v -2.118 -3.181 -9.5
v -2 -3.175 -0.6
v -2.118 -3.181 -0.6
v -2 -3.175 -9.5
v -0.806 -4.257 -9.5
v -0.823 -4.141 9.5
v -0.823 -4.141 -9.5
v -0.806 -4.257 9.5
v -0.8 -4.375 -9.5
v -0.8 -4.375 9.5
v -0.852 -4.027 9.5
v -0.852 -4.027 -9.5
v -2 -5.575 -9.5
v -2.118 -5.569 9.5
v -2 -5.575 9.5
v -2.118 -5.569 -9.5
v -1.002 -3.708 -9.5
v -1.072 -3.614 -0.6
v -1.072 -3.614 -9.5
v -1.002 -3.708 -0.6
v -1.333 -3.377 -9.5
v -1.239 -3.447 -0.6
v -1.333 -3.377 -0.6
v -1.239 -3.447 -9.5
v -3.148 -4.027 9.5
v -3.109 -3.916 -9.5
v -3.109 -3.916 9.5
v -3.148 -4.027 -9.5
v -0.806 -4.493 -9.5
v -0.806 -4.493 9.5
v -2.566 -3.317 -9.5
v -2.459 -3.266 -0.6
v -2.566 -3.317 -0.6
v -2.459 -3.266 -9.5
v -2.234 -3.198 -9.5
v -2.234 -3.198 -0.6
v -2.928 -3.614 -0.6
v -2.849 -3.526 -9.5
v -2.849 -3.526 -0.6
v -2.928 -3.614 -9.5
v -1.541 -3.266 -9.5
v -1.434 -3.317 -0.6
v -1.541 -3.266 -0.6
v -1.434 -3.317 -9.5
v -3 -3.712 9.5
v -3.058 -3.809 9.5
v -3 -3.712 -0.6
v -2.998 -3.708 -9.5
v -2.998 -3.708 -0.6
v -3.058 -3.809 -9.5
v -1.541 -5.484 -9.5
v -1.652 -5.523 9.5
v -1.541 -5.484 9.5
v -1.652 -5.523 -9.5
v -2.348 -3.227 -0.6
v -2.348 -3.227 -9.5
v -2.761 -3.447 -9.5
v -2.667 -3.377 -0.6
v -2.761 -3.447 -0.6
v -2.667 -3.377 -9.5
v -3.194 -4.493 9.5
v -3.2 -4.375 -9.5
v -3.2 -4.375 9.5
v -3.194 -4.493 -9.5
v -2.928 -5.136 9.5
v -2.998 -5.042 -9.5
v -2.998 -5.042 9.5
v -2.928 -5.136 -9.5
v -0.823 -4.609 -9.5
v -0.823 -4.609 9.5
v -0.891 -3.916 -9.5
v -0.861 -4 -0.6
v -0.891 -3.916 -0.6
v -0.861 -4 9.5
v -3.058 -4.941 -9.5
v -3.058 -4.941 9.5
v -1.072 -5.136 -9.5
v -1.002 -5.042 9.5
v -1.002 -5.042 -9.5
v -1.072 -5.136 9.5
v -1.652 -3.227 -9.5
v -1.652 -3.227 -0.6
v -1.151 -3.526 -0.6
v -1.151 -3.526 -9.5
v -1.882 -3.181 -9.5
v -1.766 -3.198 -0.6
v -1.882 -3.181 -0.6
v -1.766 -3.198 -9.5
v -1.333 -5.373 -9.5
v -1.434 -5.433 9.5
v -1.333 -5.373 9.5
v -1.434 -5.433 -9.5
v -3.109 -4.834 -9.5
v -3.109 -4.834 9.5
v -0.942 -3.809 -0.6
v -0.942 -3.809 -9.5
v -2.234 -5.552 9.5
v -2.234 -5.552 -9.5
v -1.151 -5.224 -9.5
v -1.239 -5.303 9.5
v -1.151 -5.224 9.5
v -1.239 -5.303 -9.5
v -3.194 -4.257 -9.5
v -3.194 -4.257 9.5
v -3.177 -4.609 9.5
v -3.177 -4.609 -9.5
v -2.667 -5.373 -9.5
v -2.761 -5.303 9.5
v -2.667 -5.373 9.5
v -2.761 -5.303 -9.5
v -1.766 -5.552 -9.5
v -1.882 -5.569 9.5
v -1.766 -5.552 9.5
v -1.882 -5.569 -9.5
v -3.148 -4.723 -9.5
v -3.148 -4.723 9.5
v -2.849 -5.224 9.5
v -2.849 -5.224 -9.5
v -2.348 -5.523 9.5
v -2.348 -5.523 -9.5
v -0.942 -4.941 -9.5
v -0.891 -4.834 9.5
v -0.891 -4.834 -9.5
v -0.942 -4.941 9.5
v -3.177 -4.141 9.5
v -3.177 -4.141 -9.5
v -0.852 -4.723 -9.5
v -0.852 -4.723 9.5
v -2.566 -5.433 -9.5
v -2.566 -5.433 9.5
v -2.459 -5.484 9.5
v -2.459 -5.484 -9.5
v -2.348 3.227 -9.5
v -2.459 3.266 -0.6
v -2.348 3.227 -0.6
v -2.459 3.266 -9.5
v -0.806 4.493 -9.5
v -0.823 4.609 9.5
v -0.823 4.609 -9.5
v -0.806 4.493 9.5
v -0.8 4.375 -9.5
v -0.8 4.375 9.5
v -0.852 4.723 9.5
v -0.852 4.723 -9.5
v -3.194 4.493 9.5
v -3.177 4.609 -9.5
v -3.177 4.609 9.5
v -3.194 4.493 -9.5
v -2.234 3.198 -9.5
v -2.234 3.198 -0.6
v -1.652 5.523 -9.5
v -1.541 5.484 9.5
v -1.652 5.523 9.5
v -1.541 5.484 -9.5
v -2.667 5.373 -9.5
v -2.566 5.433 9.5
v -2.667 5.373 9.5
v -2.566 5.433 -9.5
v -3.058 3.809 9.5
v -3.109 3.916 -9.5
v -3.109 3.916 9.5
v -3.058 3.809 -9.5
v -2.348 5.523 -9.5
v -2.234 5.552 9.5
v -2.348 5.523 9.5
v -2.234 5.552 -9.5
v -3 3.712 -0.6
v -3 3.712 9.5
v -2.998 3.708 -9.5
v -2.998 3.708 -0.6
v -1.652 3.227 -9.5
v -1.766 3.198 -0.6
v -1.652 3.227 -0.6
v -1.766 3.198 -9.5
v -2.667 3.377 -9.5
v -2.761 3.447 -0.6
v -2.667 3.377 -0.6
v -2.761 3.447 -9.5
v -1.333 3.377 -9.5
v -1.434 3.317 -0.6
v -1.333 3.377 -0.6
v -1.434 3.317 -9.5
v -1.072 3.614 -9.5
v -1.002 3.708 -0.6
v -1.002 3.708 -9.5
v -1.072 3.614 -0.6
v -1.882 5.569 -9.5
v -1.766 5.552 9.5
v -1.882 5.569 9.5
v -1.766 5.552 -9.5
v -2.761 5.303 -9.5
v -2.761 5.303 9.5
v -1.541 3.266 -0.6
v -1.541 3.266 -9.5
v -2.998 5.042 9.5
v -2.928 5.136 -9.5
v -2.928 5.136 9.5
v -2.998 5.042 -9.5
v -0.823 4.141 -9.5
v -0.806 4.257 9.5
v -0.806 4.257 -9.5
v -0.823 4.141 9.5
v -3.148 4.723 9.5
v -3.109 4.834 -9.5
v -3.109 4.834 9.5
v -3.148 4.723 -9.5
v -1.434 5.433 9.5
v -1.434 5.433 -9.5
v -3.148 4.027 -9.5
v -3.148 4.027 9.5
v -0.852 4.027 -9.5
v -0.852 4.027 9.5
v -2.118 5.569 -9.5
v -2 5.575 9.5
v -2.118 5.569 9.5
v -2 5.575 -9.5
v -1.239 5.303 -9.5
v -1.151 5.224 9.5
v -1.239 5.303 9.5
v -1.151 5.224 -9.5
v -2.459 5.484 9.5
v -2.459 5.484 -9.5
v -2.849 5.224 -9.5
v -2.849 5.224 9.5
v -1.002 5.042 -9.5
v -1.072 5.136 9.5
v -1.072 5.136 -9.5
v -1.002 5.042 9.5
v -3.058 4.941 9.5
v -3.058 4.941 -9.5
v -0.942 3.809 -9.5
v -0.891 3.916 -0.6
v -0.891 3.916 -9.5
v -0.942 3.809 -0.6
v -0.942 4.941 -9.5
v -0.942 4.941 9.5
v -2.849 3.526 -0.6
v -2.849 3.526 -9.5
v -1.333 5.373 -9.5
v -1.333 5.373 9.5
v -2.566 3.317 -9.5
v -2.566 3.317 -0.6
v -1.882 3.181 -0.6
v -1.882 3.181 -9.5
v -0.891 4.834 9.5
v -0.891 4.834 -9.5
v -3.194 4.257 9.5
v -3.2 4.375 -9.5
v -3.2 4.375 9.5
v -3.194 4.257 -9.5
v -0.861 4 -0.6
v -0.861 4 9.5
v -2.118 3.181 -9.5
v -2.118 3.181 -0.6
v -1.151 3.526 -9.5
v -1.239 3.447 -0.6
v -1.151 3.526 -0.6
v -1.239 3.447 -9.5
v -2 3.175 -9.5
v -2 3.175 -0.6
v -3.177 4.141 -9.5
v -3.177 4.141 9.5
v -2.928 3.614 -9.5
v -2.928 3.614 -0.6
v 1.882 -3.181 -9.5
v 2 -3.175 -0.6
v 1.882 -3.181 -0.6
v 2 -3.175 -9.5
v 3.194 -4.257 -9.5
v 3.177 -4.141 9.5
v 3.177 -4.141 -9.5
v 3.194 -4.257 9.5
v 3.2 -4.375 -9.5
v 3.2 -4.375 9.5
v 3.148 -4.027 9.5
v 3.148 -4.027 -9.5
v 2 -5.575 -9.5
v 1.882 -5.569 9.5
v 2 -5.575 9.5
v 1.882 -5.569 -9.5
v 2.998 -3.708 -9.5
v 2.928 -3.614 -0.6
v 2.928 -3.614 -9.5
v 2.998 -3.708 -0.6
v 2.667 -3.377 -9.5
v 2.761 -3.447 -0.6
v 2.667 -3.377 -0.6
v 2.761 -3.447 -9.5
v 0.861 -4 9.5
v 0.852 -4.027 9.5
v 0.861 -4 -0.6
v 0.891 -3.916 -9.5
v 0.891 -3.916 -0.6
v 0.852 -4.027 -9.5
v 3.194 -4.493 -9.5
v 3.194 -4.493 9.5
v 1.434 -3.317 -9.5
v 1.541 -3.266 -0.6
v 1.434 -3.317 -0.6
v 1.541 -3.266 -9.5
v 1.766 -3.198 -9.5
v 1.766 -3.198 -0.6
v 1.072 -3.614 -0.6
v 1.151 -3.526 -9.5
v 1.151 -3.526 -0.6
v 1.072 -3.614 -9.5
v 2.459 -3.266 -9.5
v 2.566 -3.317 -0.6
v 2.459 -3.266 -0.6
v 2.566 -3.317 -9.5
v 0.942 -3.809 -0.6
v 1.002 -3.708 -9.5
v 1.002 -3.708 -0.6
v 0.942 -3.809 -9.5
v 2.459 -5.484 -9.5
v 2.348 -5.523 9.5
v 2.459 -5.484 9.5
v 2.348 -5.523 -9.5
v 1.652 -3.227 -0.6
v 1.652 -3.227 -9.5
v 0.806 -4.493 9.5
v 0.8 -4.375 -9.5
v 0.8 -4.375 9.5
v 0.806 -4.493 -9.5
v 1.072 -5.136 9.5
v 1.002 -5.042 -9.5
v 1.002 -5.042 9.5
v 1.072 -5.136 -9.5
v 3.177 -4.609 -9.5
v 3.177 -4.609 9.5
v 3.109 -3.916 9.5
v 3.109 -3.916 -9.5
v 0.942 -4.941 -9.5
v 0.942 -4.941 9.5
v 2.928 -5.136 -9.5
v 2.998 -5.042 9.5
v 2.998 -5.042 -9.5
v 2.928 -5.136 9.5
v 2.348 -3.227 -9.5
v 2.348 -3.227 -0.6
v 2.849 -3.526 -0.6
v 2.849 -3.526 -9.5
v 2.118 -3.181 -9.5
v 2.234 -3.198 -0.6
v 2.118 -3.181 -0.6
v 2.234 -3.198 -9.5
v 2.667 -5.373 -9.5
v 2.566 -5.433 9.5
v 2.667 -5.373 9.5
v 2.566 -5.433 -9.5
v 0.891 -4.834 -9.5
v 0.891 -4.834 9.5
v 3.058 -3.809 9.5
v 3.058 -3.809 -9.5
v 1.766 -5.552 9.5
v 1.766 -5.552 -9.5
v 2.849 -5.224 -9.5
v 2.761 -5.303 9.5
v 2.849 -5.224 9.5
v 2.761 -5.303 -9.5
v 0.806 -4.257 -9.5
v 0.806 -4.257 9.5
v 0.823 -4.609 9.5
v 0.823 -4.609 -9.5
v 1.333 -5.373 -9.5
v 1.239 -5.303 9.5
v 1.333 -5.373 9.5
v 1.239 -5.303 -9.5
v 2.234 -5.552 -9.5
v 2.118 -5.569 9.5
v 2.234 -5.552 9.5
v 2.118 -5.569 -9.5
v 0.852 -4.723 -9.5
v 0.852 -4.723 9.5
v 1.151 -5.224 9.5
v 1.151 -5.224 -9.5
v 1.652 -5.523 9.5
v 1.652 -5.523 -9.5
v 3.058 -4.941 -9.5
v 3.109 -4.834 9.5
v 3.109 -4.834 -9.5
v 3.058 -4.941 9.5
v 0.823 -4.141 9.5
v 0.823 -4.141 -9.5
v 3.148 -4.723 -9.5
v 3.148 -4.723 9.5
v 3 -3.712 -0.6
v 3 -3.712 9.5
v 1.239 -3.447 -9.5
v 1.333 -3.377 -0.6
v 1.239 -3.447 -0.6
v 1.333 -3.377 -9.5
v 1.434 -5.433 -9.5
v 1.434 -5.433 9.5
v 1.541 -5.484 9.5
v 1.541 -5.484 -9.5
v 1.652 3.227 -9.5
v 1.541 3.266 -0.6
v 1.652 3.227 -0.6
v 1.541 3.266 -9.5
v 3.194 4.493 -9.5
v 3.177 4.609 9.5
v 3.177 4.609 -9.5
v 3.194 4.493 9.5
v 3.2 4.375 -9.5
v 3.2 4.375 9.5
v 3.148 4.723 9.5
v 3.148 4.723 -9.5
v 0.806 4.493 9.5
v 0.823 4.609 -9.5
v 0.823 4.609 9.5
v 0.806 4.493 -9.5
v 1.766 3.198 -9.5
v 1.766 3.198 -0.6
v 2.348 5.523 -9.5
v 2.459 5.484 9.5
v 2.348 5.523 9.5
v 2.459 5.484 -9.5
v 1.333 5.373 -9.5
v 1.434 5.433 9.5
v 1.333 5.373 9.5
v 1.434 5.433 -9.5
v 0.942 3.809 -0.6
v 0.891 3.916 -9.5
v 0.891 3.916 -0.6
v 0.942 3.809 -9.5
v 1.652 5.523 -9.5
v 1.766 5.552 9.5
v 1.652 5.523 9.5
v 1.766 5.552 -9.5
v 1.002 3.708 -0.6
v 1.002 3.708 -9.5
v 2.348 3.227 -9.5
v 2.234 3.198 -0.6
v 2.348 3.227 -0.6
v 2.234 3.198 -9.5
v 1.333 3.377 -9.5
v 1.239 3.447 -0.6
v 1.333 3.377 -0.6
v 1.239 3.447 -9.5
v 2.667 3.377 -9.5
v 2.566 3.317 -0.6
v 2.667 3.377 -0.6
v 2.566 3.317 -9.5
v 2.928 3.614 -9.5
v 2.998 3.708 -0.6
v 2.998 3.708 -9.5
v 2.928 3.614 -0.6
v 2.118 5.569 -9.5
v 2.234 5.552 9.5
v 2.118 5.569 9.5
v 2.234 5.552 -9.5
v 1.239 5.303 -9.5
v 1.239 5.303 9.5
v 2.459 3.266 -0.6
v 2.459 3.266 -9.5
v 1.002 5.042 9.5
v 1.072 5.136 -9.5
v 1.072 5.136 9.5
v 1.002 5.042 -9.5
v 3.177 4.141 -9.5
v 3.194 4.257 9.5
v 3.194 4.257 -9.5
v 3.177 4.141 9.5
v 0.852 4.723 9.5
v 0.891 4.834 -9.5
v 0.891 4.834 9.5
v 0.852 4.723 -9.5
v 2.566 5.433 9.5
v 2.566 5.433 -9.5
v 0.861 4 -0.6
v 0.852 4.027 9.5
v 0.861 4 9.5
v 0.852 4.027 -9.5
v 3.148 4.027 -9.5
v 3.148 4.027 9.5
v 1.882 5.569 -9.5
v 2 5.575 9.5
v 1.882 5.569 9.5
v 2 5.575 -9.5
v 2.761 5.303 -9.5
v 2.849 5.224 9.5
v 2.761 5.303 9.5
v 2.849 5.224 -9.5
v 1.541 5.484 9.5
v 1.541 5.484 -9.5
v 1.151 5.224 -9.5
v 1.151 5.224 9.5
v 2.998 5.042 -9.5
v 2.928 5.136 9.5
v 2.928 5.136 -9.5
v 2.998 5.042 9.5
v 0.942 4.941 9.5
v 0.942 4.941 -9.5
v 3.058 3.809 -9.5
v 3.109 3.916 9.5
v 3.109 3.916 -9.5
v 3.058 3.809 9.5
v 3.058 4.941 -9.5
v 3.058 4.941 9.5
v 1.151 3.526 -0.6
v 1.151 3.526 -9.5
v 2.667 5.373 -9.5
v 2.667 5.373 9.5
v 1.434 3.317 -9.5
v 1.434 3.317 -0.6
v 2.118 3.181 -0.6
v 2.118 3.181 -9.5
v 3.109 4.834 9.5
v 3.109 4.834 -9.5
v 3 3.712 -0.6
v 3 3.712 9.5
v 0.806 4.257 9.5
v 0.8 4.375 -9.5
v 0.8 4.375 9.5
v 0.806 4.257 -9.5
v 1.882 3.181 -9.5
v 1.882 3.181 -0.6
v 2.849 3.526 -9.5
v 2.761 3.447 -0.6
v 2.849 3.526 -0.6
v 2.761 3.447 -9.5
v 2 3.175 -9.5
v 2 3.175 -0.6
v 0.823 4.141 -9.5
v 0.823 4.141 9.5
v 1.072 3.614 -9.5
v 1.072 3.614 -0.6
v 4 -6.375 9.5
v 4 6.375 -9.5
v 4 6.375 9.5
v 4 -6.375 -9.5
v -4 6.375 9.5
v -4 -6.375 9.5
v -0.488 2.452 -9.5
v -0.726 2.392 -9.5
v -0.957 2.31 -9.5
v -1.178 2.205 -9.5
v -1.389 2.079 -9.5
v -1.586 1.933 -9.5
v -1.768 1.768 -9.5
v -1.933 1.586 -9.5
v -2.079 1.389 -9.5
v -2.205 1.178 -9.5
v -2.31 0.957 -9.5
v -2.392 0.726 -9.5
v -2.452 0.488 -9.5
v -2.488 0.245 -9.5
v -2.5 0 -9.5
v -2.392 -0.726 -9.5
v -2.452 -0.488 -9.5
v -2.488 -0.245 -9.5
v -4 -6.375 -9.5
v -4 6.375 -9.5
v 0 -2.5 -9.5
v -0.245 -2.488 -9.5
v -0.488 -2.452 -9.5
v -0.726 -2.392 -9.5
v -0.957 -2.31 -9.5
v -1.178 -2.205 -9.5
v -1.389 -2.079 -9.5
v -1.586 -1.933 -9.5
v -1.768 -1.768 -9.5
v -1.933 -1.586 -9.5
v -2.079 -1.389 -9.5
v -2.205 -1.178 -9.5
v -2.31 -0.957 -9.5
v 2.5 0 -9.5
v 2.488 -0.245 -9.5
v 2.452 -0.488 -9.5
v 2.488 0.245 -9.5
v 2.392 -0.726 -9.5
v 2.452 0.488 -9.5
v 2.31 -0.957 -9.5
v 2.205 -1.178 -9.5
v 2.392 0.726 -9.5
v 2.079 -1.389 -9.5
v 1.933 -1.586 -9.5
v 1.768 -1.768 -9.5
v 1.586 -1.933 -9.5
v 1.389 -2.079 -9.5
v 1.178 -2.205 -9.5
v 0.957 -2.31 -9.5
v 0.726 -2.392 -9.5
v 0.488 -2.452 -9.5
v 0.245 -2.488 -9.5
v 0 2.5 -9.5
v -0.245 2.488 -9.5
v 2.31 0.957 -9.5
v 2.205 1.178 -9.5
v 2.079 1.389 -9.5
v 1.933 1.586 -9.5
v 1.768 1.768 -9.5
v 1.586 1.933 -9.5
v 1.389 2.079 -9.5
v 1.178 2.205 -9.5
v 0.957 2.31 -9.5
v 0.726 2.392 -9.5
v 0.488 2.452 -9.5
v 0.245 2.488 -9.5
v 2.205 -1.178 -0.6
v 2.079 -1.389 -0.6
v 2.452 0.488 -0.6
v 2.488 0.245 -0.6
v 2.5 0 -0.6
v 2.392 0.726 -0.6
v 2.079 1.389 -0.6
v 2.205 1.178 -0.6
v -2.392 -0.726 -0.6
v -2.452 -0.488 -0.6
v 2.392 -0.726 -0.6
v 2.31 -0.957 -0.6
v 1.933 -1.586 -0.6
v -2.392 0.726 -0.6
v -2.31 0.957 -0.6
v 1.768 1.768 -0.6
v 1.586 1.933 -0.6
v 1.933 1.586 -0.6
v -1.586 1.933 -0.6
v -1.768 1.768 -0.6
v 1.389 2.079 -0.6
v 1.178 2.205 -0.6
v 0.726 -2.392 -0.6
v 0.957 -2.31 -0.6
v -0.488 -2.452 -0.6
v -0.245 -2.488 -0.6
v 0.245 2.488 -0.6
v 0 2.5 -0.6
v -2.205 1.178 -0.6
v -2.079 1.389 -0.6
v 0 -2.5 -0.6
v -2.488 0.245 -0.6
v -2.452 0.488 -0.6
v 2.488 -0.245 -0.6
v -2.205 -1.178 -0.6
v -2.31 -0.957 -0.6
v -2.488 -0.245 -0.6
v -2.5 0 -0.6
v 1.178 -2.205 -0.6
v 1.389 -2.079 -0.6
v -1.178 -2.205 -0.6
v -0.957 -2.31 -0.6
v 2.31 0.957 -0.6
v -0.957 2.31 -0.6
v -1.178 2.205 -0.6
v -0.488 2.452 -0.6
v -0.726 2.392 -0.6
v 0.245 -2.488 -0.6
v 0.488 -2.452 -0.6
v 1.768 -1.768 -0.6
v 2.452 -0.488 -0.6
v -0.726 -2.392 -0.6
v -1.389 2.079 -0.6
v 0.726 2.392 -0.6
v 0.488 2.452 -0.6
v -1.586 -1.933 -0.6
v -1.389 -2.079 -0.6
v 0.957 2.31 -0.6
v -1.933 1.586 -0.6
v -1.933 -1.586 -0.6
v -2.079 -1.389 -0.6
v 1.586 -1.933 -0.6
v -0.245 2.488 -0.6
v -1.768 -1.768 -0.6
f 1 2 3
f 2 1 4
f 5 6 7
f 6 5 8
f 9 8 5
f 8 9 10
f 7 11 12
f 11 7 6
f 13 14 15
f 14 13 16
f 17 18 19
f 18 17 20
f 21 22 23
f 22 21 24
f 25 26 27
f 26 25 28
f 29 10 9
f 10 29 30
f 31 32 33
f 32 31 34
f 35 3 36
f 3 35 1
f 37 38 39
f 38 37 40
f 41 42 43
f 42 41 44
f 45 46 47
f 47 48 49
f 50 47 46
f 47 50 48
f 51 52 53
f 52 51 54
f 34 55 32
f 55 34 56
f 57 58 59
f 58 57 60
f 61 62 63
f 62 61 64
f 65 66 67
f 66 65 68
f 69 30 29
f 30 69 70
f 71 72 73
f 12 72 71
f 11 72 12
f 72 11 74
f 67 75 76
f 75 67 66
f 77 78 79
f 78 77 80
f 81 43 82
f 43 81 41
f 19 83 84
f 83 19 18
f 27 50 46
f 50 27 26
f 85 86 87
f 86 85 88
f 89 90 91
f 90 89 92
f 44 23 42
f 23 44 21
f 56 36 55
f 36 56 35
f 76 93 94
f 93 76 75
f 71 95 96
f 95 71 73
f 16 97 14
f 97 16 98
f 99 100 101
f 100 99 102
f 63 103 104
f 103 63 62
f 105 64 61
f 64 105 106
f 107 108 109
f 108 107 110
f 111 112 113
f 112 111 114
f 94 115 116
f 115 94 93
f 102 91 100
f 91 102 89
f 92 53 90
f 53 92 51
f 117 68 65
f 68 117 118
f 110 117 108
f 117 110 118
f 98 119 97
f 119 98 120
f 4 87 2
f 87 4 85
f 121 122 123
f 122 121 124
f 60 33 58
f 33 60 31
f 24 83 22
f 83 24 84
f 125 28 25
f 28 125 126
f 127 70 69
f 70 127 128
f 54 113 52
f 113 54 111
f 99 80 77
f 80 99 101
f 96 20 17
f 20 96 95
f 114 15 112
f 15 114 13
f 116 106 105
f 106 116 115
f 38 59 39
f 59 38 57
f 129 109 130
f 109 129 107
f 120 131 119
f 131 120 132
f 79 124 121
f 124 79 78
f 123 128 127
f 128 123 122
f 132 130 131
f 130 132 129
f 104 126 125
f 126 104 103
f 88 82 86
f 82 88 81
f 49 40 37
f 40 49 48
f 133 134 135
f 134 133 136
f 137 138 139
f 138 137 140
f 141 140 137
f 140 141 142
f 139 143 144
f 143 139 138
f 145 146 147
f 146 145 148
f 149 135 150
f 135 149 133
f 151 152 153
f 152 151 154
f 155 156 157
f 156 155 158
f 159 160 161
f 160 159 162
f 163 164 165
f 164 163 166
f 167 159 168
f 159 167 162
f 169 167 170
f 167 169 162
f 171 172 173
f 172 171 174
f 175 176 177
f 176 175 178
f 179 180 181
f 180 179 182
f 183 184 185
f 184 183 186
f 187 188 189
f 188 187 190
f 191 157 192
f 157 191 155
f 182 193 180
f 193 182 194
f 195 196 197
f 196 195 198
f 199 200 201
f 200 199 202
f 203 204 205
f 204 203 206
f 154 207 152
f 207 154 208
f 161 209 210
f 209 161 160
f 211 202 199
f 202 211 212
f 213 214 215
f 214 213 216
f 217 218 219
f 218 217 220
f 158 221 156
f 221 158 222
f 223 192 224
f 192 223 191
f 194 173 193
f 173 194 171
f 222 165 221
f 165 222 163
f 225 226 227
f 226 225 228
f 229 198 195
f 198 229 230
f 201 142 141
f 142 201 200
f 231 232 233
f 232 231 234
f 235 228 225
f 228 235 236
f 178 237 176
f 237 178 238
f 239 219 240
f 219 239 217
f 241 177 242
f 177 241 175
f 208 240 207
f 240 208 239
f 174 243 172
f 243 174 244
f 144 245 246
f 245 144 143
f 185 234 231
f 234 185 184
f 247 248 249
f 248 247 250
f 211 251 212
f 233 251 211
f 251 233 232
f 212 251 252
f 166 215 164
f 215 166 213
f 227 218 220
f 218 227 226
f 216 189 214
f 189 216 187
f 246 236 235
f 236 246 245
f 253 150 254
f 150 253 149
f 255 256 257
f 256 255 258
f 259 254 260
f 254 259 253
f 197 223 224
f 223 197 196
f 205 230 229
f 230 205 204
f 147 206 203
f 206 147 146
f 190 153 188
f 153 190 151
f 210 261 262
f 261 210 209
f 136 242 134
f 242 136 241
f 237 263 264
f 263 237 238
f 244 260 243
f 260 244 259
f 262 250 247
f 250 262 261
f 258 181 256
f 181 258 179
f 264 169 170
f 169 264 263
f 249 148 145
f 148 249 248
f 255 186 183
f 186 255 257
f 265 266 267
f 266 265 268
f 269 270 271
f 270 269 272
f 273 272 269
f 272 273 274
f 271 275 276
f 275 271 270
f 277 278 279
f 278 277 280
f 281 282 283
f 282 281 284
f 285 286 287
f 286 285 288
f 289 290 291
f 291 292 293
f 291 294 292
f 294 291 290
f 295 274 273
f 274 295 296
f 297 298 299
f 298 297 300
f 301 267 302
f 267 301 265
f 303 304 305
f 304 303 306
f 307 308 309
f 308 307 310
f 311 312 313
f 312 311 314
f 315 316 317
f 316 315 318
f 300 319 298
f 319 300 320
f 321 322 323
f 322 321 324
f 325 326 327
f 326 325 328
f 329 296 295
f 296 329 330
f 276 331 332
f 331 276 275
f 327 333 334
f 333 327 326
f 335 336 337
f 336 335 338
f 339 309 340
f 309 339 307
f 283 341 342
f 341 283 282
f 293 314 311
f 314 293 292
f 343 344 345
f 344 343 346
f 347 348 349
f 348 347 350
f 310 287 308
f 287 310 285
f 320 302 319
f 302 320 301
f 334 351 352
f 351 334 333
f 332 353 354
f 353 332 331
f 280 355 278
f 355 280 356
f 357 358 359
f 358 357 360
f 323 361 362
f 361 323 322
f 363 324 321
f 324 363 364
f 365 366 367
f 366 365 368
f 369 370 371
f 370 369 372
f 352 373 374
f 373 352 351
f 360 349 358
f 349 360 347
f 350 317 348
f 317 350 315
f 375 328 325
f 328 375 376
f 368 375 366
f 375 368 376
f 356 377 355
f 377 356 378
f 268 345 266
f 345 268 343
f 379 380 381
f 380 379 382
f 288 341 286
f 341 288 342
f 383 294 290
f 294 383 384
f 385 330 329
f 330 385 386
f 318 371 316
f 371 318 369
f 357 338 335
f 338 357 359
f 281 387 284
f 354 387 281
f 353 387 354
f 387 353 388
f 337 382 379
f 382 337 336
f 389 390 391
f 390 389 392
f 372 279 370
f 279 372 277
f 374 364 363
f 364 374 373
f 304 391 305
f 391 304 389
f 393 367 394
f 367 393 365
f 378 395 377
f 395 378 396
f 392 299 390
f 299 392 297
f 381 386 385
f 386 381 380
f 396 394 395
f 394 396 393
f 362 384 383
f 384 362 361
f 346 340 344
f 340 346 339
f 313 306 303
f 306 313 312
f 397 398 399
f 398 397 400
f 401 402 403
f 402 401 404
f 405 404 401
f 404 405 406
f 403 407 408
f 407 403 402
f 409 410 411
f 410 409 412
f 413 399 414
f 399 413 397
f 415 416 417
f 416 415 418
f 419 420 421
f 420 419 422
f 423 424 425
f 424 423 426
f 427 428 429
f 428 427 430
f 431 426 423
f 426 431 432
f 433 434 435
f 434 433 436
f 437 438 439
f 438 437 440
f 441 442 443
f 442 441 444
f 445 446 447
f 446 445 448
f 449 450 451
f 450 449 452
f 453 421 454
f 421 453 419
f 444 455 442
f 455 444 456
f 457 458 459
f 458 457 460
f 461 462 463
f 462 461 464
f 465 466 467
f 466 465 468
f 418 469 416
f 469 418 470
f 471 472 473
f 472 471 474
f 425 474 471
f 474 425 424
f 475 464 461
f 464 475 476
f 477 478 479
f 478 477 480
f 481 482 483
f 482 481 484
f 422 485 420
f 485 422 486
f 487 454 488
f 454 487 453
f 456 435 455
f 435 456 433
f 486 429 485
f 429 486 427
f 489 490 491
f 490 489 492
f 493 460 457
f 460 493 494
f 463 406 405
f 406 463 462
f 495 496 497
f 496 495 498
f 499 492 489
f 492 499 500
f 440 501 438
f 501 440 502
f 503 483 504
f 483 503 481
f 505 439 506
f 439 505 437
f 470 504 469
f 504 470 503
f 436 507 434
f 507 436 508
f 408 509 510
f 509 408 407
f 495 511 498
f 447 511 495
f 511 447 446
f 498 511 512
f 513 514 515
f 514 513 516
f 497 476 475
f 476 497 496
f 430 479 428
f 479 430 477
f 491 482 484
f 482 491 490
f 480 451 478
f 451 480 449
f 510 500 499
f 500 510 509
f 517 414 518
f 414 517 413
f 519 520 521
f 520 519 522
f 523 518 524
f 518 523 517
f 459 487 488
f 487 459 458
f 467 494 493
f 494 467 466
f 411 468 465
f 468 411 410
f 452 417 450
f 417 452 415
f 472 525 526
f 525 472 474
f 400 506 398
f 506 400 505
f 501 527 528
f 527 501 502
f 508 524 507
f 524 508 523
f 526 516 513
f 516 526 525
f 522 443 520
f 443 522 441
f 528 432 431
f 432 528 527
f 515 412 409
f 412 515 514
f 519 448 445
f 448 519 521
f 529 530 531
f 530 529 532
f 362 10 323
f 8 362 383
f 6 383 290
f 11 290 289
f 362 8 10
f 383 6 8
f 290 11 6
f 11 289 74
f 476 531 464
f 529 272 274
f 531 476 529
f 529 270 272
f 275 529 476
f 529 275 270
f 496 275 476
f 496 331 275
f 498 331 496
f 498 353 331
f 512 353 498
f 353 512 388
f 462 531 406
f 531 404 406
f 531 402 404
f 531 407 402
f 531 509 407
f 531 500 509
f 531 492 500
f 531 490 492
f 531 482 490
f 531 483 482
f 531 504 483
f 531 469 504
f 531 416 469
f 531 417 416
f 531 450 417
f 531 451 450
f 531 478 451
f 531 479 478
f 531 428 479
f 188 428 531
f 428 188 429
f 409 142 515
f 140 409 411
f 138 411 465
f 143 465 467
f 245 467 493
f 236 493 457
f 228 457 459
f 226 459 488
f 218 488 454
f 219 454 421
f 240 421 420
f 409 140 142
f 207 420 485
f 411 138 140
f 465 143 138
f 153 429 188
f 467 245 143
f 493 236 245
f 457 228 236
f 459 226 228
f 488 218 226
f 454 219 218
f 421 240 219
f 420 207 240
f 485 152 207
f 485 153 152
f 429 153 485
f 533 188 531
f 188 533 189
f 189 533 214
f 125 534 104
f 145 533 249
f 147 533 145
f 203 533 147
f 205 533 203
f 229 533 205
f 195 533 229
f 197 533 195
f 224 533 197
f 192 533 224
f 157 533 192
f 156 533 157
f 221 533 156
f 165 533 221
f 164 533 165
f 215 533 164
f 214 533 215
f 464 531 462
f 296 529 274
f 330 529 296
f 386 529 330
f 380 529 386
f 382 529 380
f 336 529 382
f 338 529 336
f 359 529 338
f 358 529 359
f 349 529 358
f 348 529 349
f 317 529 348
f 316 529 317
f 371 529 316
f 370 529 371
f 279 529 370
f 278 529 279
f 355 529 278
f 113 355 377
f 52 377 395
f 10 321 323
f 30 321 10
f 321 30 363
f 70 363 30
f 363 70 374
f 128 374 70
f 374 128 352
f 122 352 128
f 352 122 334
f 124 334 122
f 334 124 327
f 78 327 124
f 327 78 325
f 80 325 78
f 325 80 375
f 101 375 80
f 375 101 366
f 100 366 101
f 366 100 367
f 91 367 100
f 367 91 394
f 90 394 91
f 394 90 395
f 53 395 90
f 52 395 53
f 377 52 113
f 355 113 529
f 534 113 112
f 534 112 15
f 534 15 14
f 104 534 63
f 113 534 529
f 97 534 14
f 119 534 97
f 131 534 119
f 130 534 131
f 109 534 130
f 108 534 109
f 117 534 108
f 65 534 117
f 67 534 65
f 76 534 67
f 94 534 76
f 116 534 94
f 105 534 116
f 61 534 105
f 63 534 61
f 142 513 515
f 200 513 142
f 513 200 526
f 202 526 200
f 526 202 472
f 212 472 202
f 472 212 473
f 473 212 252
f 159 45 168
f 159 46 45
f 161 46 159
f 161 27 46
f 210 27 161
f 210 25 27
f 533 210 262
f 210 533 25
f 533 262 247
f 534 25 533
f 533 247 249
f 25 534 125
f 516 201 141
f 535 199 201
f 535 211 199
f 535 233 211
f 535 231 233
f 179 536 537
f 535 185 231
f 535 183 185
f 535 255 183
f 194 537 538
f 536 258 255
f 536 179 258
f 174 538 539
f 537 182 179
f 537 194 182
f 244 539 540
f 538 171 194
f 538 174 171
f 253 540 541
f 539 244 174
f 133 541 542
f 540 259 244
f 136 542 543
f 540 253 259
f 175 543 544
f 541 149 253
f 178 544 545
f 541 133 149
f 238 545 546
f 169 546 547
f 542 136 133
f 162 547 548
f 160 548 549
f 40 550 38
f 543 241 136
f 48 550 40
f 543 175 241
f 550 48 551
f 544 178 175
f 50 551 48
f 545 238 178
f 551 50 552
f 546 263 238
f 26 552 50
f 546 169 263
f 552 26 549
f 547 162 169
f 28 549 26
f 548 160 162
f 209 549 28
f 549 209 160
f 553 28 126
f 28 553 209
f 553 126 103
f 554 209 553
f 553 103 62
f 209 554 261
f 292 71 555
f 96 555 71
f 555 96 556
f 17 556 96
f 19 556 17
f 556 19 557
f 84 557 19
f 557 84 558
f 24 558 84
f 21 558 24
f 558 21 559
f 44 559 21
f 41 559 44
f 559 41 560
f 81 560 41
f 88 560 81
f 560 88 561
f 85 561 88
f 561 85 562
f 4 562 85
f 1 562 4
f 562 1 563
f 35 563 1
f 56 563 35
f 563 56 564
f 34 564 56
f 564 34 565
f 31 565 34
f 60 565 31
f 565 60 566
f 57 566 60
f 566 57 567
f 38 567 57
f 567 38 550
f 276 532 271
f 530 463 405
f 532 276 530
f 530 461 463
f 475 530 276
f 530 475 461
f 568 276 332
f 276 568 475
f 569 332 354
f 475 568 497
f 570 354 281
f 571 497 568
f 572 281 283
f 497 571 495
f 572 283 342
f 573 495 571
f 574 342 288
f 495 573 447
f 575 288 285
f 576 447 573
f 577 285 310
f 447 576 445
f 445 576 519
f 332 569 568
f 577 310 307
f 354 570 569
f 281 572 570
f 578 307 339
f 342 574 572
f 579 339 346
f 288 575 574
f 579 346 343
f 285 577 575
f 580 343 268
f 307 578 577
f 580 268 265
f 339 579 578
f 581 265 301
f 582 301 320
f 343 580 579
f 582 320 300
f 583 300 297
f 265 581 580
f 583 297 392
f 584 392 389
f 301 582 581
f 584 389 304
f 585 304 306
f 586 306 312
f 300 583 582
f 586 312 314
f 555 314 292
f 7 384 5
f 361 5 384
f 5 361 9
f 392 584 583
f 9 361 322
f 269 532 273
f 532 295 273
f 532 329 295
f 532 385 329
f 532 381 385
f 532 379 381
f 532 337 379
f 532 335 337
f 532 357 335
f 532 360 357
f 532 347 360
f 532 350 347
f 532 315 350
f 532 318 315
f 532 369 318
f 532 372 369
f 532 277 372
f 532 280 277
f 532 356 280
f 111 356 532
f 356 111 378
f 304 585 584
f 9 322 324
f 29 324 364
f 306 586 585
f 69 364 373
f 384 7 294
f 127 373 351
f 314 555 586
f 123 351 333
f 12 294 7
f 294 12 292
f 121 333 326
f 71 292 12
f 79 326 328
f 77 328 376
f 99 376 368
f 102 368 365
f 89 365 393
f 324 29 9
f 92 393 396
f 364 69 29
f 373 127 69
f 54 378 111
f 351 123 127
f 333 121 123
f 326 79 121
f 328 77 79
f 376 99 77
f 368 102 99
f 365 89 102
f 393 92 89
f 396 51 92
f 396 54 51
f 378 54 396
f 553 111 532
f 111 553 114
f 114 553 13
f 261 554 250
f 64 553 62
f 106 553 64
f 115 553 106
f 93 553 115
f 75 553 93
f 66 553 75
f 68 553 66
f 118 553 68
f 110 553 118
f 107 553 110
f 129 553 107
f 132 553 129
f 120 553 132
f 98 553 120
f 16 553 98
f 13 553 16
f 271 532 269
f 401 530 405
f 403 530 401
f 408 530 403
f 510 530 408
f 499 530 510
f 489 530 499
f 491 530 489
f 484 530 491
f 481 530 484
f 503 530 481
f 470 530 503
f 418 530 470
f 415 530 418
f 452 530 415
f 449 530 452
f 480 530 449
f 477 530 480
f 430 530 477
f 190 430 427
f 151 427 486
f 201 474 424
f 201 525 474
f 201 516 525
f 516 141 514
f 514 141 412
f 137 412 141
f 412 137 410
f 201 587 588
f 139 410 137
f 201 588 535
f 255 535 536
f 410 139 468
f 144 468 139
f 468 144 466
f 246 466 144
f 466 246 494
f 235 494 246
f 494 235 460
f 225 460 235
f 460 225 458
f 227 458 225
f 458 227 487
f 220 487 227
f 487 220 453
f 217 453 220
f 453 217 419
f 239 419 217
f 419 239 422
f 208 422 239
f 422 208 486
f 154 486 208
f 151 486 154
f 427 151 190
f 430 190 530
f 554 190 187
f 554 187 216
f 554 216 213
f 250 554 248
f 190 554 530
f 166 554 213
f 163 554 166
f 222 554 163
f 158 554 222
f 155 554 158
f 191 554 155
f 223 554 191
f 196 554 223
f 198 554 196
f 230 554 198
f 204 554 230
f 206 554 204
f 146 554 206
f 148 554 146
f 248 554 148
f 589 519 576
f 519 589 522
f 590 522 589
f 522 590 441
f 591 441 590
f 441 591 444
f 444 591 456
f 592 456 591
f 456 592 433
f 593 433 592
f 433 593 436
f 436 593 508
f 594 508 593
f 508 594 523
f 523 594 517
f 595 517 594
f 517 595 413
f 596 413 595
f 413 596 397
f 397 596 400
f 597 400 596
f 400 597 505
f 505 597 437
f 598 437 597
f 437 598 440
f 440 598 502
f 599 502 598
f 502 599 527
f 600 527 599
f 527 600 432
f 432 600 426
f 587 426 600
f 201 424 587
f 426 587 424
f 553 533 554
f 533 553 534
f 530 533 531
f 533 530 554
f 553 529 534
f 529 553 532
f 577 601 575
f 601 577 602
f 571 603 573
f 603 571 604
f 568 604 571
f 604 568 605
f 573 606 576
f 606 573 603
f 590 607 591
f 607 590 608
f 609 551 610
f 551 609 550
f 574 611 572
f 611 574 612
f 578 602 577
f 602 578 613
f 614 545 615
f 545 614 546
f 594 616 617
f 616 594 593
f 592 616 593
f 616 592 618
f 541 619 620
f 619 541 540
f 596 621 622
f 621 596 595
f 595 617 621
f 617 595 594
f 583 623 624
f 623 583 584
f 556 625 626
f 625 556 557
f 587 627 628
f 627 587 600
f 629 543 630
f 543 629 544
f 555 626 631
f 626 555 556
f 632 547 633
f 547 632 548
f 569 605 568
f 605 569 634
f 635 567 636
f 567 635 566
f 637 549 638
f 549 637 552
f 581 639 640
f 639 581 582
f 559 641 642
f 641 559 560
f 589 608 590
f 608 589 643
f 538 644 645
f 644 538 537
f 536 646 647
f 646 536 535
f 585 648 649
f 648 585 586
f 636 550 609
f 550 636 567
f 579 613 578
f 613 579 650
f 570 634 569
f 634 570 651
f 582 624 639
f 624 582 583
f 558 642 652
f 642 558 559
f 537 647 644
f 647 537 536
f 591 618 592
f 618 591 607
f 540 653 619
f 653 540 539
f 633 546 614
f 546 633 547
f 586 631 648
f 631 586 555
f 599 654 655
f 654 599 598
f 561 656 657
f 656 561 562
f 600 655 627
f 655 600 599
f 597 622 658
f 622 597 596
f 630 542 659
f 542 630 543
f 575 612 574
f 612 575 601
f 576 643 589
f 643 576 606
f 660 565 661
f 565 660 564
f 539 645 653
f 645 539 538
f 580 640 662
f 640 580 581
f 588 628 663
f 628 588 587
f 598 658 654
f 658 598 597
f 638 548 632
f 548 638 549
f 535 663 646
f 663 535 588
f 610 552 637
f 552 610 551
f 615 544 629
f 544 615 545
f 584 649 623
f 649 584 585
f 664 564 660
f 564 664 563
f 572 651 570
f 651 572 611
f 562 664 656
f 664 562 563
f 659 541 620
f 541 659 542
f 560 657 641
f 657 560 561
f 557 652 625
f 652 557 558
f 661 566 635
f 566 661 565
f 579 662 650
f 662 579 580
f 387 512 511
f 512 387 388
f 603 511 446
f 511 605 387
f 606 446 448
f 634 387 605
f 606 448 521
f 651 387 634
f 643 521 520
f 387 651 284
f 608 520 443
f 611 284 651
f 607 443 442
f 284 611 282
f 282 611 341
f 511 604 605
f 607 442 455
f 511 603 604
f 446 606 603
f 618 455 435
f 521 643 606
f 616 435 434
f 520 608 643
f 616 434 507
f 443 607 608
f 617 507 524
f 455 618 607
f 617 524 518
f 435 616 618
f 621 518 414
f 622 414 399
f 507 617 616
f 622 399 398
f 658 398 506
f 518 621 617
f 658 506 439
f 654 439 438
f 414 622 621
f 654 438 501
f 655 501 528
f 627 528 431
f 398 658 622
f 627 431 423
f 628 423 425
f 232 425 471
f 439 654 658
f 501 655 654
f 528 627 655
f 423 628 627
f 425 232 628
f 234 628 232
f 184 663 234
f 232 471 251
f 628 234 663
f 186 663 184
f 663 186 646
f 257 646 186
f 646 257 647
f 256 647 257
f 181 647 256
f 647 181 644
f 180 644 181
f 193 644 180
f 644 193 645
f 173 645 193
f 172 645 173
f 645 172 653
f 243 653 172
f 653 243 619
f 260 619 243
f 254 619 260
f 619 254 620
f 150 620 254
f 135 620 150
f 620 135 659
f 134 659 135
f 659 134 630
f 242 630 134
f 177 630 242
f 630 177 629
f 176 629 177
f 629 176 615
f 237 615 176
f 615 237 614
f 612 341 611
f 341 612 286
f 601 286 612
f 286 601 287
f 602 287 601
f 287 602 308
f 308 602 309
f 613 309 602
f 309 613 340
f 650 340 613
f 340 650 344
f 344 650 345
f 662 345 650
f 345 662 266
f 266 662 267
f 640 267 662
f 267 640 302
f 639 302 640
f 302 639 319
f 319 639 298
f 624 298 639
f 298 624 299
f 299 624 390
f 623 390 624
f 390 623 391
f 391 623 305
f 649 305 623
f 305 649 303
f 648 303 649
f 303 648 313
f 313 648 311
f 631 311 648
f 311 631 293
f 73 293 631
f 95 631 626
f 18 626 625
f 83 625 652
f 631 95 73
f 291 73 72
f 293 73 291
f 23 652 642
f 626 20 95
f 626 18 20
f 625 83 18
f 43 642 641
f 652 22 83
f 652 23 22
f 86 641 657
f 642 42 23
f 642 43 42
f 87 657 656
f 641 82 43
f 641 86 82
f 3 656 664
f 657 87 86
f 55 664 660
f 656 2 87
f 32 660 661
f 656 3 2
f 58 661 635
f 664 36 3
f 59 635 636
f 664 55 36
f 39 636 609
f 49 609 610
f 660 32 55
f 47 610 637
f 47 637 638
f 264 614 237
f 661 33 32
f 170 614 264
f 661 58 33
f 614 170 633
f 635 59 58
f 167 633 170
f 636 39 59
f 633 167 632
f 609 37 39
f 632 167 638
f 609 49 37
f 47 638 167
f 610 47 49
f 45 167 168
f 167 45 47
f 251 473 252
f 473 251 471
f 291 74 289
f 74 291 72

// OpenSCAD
$fn = 64;

// Leadscrew nut housing: 8.0mm x 12.75mm x 19.0mm block (X x Y x Z)
module leadscrew_nut_housing() {
    // Overall block dimensions
    L = 8.0;     // X
    W = 12.75;   // Y
    H = 19.0;    // Z

    // Features (kept conservative so the part remains a single connected solid)
    bore_r = 2.5;          // through bore radius
    nut_x = 6.0;           // nut cavity size in X
    nut_y = 8.0;           // nut cavity size in Y
    nut_h = 10.0;          // nut cavity height in Z (blind pocket)
    nut_floor = 2.0;       // material left at bottom

    hole_r = 1.2;          // mounting hole radius
    hole_edge = 2.0;       // edge margin from X/Y faces

    difference() {
        // Main body centered at origin
        cube([L, W, H], center=true);

        // Through bore along Z, centered
        cylinder(h=H + 0.4, r=bore_r, center=true);

        // Blind nut cavity from top face downward
        translate([0, 0, H/2 - nut_h/2])
            cube([nut_x, nut_y, nut_h + 0.2], center=true);

        // 4 mounting holes through Z, positioned by formulas from dimensions
        for (sx = [-1, 1])
            for (sy = [-1, 1])
                translate([sx*(L/2 - hole_edge), sy*(W/2 - hole_edge), 0])
                    cylinder(h=H + 0.4, r=hole_r, center=true);
    }
}

leadscrew_nut_housing();
